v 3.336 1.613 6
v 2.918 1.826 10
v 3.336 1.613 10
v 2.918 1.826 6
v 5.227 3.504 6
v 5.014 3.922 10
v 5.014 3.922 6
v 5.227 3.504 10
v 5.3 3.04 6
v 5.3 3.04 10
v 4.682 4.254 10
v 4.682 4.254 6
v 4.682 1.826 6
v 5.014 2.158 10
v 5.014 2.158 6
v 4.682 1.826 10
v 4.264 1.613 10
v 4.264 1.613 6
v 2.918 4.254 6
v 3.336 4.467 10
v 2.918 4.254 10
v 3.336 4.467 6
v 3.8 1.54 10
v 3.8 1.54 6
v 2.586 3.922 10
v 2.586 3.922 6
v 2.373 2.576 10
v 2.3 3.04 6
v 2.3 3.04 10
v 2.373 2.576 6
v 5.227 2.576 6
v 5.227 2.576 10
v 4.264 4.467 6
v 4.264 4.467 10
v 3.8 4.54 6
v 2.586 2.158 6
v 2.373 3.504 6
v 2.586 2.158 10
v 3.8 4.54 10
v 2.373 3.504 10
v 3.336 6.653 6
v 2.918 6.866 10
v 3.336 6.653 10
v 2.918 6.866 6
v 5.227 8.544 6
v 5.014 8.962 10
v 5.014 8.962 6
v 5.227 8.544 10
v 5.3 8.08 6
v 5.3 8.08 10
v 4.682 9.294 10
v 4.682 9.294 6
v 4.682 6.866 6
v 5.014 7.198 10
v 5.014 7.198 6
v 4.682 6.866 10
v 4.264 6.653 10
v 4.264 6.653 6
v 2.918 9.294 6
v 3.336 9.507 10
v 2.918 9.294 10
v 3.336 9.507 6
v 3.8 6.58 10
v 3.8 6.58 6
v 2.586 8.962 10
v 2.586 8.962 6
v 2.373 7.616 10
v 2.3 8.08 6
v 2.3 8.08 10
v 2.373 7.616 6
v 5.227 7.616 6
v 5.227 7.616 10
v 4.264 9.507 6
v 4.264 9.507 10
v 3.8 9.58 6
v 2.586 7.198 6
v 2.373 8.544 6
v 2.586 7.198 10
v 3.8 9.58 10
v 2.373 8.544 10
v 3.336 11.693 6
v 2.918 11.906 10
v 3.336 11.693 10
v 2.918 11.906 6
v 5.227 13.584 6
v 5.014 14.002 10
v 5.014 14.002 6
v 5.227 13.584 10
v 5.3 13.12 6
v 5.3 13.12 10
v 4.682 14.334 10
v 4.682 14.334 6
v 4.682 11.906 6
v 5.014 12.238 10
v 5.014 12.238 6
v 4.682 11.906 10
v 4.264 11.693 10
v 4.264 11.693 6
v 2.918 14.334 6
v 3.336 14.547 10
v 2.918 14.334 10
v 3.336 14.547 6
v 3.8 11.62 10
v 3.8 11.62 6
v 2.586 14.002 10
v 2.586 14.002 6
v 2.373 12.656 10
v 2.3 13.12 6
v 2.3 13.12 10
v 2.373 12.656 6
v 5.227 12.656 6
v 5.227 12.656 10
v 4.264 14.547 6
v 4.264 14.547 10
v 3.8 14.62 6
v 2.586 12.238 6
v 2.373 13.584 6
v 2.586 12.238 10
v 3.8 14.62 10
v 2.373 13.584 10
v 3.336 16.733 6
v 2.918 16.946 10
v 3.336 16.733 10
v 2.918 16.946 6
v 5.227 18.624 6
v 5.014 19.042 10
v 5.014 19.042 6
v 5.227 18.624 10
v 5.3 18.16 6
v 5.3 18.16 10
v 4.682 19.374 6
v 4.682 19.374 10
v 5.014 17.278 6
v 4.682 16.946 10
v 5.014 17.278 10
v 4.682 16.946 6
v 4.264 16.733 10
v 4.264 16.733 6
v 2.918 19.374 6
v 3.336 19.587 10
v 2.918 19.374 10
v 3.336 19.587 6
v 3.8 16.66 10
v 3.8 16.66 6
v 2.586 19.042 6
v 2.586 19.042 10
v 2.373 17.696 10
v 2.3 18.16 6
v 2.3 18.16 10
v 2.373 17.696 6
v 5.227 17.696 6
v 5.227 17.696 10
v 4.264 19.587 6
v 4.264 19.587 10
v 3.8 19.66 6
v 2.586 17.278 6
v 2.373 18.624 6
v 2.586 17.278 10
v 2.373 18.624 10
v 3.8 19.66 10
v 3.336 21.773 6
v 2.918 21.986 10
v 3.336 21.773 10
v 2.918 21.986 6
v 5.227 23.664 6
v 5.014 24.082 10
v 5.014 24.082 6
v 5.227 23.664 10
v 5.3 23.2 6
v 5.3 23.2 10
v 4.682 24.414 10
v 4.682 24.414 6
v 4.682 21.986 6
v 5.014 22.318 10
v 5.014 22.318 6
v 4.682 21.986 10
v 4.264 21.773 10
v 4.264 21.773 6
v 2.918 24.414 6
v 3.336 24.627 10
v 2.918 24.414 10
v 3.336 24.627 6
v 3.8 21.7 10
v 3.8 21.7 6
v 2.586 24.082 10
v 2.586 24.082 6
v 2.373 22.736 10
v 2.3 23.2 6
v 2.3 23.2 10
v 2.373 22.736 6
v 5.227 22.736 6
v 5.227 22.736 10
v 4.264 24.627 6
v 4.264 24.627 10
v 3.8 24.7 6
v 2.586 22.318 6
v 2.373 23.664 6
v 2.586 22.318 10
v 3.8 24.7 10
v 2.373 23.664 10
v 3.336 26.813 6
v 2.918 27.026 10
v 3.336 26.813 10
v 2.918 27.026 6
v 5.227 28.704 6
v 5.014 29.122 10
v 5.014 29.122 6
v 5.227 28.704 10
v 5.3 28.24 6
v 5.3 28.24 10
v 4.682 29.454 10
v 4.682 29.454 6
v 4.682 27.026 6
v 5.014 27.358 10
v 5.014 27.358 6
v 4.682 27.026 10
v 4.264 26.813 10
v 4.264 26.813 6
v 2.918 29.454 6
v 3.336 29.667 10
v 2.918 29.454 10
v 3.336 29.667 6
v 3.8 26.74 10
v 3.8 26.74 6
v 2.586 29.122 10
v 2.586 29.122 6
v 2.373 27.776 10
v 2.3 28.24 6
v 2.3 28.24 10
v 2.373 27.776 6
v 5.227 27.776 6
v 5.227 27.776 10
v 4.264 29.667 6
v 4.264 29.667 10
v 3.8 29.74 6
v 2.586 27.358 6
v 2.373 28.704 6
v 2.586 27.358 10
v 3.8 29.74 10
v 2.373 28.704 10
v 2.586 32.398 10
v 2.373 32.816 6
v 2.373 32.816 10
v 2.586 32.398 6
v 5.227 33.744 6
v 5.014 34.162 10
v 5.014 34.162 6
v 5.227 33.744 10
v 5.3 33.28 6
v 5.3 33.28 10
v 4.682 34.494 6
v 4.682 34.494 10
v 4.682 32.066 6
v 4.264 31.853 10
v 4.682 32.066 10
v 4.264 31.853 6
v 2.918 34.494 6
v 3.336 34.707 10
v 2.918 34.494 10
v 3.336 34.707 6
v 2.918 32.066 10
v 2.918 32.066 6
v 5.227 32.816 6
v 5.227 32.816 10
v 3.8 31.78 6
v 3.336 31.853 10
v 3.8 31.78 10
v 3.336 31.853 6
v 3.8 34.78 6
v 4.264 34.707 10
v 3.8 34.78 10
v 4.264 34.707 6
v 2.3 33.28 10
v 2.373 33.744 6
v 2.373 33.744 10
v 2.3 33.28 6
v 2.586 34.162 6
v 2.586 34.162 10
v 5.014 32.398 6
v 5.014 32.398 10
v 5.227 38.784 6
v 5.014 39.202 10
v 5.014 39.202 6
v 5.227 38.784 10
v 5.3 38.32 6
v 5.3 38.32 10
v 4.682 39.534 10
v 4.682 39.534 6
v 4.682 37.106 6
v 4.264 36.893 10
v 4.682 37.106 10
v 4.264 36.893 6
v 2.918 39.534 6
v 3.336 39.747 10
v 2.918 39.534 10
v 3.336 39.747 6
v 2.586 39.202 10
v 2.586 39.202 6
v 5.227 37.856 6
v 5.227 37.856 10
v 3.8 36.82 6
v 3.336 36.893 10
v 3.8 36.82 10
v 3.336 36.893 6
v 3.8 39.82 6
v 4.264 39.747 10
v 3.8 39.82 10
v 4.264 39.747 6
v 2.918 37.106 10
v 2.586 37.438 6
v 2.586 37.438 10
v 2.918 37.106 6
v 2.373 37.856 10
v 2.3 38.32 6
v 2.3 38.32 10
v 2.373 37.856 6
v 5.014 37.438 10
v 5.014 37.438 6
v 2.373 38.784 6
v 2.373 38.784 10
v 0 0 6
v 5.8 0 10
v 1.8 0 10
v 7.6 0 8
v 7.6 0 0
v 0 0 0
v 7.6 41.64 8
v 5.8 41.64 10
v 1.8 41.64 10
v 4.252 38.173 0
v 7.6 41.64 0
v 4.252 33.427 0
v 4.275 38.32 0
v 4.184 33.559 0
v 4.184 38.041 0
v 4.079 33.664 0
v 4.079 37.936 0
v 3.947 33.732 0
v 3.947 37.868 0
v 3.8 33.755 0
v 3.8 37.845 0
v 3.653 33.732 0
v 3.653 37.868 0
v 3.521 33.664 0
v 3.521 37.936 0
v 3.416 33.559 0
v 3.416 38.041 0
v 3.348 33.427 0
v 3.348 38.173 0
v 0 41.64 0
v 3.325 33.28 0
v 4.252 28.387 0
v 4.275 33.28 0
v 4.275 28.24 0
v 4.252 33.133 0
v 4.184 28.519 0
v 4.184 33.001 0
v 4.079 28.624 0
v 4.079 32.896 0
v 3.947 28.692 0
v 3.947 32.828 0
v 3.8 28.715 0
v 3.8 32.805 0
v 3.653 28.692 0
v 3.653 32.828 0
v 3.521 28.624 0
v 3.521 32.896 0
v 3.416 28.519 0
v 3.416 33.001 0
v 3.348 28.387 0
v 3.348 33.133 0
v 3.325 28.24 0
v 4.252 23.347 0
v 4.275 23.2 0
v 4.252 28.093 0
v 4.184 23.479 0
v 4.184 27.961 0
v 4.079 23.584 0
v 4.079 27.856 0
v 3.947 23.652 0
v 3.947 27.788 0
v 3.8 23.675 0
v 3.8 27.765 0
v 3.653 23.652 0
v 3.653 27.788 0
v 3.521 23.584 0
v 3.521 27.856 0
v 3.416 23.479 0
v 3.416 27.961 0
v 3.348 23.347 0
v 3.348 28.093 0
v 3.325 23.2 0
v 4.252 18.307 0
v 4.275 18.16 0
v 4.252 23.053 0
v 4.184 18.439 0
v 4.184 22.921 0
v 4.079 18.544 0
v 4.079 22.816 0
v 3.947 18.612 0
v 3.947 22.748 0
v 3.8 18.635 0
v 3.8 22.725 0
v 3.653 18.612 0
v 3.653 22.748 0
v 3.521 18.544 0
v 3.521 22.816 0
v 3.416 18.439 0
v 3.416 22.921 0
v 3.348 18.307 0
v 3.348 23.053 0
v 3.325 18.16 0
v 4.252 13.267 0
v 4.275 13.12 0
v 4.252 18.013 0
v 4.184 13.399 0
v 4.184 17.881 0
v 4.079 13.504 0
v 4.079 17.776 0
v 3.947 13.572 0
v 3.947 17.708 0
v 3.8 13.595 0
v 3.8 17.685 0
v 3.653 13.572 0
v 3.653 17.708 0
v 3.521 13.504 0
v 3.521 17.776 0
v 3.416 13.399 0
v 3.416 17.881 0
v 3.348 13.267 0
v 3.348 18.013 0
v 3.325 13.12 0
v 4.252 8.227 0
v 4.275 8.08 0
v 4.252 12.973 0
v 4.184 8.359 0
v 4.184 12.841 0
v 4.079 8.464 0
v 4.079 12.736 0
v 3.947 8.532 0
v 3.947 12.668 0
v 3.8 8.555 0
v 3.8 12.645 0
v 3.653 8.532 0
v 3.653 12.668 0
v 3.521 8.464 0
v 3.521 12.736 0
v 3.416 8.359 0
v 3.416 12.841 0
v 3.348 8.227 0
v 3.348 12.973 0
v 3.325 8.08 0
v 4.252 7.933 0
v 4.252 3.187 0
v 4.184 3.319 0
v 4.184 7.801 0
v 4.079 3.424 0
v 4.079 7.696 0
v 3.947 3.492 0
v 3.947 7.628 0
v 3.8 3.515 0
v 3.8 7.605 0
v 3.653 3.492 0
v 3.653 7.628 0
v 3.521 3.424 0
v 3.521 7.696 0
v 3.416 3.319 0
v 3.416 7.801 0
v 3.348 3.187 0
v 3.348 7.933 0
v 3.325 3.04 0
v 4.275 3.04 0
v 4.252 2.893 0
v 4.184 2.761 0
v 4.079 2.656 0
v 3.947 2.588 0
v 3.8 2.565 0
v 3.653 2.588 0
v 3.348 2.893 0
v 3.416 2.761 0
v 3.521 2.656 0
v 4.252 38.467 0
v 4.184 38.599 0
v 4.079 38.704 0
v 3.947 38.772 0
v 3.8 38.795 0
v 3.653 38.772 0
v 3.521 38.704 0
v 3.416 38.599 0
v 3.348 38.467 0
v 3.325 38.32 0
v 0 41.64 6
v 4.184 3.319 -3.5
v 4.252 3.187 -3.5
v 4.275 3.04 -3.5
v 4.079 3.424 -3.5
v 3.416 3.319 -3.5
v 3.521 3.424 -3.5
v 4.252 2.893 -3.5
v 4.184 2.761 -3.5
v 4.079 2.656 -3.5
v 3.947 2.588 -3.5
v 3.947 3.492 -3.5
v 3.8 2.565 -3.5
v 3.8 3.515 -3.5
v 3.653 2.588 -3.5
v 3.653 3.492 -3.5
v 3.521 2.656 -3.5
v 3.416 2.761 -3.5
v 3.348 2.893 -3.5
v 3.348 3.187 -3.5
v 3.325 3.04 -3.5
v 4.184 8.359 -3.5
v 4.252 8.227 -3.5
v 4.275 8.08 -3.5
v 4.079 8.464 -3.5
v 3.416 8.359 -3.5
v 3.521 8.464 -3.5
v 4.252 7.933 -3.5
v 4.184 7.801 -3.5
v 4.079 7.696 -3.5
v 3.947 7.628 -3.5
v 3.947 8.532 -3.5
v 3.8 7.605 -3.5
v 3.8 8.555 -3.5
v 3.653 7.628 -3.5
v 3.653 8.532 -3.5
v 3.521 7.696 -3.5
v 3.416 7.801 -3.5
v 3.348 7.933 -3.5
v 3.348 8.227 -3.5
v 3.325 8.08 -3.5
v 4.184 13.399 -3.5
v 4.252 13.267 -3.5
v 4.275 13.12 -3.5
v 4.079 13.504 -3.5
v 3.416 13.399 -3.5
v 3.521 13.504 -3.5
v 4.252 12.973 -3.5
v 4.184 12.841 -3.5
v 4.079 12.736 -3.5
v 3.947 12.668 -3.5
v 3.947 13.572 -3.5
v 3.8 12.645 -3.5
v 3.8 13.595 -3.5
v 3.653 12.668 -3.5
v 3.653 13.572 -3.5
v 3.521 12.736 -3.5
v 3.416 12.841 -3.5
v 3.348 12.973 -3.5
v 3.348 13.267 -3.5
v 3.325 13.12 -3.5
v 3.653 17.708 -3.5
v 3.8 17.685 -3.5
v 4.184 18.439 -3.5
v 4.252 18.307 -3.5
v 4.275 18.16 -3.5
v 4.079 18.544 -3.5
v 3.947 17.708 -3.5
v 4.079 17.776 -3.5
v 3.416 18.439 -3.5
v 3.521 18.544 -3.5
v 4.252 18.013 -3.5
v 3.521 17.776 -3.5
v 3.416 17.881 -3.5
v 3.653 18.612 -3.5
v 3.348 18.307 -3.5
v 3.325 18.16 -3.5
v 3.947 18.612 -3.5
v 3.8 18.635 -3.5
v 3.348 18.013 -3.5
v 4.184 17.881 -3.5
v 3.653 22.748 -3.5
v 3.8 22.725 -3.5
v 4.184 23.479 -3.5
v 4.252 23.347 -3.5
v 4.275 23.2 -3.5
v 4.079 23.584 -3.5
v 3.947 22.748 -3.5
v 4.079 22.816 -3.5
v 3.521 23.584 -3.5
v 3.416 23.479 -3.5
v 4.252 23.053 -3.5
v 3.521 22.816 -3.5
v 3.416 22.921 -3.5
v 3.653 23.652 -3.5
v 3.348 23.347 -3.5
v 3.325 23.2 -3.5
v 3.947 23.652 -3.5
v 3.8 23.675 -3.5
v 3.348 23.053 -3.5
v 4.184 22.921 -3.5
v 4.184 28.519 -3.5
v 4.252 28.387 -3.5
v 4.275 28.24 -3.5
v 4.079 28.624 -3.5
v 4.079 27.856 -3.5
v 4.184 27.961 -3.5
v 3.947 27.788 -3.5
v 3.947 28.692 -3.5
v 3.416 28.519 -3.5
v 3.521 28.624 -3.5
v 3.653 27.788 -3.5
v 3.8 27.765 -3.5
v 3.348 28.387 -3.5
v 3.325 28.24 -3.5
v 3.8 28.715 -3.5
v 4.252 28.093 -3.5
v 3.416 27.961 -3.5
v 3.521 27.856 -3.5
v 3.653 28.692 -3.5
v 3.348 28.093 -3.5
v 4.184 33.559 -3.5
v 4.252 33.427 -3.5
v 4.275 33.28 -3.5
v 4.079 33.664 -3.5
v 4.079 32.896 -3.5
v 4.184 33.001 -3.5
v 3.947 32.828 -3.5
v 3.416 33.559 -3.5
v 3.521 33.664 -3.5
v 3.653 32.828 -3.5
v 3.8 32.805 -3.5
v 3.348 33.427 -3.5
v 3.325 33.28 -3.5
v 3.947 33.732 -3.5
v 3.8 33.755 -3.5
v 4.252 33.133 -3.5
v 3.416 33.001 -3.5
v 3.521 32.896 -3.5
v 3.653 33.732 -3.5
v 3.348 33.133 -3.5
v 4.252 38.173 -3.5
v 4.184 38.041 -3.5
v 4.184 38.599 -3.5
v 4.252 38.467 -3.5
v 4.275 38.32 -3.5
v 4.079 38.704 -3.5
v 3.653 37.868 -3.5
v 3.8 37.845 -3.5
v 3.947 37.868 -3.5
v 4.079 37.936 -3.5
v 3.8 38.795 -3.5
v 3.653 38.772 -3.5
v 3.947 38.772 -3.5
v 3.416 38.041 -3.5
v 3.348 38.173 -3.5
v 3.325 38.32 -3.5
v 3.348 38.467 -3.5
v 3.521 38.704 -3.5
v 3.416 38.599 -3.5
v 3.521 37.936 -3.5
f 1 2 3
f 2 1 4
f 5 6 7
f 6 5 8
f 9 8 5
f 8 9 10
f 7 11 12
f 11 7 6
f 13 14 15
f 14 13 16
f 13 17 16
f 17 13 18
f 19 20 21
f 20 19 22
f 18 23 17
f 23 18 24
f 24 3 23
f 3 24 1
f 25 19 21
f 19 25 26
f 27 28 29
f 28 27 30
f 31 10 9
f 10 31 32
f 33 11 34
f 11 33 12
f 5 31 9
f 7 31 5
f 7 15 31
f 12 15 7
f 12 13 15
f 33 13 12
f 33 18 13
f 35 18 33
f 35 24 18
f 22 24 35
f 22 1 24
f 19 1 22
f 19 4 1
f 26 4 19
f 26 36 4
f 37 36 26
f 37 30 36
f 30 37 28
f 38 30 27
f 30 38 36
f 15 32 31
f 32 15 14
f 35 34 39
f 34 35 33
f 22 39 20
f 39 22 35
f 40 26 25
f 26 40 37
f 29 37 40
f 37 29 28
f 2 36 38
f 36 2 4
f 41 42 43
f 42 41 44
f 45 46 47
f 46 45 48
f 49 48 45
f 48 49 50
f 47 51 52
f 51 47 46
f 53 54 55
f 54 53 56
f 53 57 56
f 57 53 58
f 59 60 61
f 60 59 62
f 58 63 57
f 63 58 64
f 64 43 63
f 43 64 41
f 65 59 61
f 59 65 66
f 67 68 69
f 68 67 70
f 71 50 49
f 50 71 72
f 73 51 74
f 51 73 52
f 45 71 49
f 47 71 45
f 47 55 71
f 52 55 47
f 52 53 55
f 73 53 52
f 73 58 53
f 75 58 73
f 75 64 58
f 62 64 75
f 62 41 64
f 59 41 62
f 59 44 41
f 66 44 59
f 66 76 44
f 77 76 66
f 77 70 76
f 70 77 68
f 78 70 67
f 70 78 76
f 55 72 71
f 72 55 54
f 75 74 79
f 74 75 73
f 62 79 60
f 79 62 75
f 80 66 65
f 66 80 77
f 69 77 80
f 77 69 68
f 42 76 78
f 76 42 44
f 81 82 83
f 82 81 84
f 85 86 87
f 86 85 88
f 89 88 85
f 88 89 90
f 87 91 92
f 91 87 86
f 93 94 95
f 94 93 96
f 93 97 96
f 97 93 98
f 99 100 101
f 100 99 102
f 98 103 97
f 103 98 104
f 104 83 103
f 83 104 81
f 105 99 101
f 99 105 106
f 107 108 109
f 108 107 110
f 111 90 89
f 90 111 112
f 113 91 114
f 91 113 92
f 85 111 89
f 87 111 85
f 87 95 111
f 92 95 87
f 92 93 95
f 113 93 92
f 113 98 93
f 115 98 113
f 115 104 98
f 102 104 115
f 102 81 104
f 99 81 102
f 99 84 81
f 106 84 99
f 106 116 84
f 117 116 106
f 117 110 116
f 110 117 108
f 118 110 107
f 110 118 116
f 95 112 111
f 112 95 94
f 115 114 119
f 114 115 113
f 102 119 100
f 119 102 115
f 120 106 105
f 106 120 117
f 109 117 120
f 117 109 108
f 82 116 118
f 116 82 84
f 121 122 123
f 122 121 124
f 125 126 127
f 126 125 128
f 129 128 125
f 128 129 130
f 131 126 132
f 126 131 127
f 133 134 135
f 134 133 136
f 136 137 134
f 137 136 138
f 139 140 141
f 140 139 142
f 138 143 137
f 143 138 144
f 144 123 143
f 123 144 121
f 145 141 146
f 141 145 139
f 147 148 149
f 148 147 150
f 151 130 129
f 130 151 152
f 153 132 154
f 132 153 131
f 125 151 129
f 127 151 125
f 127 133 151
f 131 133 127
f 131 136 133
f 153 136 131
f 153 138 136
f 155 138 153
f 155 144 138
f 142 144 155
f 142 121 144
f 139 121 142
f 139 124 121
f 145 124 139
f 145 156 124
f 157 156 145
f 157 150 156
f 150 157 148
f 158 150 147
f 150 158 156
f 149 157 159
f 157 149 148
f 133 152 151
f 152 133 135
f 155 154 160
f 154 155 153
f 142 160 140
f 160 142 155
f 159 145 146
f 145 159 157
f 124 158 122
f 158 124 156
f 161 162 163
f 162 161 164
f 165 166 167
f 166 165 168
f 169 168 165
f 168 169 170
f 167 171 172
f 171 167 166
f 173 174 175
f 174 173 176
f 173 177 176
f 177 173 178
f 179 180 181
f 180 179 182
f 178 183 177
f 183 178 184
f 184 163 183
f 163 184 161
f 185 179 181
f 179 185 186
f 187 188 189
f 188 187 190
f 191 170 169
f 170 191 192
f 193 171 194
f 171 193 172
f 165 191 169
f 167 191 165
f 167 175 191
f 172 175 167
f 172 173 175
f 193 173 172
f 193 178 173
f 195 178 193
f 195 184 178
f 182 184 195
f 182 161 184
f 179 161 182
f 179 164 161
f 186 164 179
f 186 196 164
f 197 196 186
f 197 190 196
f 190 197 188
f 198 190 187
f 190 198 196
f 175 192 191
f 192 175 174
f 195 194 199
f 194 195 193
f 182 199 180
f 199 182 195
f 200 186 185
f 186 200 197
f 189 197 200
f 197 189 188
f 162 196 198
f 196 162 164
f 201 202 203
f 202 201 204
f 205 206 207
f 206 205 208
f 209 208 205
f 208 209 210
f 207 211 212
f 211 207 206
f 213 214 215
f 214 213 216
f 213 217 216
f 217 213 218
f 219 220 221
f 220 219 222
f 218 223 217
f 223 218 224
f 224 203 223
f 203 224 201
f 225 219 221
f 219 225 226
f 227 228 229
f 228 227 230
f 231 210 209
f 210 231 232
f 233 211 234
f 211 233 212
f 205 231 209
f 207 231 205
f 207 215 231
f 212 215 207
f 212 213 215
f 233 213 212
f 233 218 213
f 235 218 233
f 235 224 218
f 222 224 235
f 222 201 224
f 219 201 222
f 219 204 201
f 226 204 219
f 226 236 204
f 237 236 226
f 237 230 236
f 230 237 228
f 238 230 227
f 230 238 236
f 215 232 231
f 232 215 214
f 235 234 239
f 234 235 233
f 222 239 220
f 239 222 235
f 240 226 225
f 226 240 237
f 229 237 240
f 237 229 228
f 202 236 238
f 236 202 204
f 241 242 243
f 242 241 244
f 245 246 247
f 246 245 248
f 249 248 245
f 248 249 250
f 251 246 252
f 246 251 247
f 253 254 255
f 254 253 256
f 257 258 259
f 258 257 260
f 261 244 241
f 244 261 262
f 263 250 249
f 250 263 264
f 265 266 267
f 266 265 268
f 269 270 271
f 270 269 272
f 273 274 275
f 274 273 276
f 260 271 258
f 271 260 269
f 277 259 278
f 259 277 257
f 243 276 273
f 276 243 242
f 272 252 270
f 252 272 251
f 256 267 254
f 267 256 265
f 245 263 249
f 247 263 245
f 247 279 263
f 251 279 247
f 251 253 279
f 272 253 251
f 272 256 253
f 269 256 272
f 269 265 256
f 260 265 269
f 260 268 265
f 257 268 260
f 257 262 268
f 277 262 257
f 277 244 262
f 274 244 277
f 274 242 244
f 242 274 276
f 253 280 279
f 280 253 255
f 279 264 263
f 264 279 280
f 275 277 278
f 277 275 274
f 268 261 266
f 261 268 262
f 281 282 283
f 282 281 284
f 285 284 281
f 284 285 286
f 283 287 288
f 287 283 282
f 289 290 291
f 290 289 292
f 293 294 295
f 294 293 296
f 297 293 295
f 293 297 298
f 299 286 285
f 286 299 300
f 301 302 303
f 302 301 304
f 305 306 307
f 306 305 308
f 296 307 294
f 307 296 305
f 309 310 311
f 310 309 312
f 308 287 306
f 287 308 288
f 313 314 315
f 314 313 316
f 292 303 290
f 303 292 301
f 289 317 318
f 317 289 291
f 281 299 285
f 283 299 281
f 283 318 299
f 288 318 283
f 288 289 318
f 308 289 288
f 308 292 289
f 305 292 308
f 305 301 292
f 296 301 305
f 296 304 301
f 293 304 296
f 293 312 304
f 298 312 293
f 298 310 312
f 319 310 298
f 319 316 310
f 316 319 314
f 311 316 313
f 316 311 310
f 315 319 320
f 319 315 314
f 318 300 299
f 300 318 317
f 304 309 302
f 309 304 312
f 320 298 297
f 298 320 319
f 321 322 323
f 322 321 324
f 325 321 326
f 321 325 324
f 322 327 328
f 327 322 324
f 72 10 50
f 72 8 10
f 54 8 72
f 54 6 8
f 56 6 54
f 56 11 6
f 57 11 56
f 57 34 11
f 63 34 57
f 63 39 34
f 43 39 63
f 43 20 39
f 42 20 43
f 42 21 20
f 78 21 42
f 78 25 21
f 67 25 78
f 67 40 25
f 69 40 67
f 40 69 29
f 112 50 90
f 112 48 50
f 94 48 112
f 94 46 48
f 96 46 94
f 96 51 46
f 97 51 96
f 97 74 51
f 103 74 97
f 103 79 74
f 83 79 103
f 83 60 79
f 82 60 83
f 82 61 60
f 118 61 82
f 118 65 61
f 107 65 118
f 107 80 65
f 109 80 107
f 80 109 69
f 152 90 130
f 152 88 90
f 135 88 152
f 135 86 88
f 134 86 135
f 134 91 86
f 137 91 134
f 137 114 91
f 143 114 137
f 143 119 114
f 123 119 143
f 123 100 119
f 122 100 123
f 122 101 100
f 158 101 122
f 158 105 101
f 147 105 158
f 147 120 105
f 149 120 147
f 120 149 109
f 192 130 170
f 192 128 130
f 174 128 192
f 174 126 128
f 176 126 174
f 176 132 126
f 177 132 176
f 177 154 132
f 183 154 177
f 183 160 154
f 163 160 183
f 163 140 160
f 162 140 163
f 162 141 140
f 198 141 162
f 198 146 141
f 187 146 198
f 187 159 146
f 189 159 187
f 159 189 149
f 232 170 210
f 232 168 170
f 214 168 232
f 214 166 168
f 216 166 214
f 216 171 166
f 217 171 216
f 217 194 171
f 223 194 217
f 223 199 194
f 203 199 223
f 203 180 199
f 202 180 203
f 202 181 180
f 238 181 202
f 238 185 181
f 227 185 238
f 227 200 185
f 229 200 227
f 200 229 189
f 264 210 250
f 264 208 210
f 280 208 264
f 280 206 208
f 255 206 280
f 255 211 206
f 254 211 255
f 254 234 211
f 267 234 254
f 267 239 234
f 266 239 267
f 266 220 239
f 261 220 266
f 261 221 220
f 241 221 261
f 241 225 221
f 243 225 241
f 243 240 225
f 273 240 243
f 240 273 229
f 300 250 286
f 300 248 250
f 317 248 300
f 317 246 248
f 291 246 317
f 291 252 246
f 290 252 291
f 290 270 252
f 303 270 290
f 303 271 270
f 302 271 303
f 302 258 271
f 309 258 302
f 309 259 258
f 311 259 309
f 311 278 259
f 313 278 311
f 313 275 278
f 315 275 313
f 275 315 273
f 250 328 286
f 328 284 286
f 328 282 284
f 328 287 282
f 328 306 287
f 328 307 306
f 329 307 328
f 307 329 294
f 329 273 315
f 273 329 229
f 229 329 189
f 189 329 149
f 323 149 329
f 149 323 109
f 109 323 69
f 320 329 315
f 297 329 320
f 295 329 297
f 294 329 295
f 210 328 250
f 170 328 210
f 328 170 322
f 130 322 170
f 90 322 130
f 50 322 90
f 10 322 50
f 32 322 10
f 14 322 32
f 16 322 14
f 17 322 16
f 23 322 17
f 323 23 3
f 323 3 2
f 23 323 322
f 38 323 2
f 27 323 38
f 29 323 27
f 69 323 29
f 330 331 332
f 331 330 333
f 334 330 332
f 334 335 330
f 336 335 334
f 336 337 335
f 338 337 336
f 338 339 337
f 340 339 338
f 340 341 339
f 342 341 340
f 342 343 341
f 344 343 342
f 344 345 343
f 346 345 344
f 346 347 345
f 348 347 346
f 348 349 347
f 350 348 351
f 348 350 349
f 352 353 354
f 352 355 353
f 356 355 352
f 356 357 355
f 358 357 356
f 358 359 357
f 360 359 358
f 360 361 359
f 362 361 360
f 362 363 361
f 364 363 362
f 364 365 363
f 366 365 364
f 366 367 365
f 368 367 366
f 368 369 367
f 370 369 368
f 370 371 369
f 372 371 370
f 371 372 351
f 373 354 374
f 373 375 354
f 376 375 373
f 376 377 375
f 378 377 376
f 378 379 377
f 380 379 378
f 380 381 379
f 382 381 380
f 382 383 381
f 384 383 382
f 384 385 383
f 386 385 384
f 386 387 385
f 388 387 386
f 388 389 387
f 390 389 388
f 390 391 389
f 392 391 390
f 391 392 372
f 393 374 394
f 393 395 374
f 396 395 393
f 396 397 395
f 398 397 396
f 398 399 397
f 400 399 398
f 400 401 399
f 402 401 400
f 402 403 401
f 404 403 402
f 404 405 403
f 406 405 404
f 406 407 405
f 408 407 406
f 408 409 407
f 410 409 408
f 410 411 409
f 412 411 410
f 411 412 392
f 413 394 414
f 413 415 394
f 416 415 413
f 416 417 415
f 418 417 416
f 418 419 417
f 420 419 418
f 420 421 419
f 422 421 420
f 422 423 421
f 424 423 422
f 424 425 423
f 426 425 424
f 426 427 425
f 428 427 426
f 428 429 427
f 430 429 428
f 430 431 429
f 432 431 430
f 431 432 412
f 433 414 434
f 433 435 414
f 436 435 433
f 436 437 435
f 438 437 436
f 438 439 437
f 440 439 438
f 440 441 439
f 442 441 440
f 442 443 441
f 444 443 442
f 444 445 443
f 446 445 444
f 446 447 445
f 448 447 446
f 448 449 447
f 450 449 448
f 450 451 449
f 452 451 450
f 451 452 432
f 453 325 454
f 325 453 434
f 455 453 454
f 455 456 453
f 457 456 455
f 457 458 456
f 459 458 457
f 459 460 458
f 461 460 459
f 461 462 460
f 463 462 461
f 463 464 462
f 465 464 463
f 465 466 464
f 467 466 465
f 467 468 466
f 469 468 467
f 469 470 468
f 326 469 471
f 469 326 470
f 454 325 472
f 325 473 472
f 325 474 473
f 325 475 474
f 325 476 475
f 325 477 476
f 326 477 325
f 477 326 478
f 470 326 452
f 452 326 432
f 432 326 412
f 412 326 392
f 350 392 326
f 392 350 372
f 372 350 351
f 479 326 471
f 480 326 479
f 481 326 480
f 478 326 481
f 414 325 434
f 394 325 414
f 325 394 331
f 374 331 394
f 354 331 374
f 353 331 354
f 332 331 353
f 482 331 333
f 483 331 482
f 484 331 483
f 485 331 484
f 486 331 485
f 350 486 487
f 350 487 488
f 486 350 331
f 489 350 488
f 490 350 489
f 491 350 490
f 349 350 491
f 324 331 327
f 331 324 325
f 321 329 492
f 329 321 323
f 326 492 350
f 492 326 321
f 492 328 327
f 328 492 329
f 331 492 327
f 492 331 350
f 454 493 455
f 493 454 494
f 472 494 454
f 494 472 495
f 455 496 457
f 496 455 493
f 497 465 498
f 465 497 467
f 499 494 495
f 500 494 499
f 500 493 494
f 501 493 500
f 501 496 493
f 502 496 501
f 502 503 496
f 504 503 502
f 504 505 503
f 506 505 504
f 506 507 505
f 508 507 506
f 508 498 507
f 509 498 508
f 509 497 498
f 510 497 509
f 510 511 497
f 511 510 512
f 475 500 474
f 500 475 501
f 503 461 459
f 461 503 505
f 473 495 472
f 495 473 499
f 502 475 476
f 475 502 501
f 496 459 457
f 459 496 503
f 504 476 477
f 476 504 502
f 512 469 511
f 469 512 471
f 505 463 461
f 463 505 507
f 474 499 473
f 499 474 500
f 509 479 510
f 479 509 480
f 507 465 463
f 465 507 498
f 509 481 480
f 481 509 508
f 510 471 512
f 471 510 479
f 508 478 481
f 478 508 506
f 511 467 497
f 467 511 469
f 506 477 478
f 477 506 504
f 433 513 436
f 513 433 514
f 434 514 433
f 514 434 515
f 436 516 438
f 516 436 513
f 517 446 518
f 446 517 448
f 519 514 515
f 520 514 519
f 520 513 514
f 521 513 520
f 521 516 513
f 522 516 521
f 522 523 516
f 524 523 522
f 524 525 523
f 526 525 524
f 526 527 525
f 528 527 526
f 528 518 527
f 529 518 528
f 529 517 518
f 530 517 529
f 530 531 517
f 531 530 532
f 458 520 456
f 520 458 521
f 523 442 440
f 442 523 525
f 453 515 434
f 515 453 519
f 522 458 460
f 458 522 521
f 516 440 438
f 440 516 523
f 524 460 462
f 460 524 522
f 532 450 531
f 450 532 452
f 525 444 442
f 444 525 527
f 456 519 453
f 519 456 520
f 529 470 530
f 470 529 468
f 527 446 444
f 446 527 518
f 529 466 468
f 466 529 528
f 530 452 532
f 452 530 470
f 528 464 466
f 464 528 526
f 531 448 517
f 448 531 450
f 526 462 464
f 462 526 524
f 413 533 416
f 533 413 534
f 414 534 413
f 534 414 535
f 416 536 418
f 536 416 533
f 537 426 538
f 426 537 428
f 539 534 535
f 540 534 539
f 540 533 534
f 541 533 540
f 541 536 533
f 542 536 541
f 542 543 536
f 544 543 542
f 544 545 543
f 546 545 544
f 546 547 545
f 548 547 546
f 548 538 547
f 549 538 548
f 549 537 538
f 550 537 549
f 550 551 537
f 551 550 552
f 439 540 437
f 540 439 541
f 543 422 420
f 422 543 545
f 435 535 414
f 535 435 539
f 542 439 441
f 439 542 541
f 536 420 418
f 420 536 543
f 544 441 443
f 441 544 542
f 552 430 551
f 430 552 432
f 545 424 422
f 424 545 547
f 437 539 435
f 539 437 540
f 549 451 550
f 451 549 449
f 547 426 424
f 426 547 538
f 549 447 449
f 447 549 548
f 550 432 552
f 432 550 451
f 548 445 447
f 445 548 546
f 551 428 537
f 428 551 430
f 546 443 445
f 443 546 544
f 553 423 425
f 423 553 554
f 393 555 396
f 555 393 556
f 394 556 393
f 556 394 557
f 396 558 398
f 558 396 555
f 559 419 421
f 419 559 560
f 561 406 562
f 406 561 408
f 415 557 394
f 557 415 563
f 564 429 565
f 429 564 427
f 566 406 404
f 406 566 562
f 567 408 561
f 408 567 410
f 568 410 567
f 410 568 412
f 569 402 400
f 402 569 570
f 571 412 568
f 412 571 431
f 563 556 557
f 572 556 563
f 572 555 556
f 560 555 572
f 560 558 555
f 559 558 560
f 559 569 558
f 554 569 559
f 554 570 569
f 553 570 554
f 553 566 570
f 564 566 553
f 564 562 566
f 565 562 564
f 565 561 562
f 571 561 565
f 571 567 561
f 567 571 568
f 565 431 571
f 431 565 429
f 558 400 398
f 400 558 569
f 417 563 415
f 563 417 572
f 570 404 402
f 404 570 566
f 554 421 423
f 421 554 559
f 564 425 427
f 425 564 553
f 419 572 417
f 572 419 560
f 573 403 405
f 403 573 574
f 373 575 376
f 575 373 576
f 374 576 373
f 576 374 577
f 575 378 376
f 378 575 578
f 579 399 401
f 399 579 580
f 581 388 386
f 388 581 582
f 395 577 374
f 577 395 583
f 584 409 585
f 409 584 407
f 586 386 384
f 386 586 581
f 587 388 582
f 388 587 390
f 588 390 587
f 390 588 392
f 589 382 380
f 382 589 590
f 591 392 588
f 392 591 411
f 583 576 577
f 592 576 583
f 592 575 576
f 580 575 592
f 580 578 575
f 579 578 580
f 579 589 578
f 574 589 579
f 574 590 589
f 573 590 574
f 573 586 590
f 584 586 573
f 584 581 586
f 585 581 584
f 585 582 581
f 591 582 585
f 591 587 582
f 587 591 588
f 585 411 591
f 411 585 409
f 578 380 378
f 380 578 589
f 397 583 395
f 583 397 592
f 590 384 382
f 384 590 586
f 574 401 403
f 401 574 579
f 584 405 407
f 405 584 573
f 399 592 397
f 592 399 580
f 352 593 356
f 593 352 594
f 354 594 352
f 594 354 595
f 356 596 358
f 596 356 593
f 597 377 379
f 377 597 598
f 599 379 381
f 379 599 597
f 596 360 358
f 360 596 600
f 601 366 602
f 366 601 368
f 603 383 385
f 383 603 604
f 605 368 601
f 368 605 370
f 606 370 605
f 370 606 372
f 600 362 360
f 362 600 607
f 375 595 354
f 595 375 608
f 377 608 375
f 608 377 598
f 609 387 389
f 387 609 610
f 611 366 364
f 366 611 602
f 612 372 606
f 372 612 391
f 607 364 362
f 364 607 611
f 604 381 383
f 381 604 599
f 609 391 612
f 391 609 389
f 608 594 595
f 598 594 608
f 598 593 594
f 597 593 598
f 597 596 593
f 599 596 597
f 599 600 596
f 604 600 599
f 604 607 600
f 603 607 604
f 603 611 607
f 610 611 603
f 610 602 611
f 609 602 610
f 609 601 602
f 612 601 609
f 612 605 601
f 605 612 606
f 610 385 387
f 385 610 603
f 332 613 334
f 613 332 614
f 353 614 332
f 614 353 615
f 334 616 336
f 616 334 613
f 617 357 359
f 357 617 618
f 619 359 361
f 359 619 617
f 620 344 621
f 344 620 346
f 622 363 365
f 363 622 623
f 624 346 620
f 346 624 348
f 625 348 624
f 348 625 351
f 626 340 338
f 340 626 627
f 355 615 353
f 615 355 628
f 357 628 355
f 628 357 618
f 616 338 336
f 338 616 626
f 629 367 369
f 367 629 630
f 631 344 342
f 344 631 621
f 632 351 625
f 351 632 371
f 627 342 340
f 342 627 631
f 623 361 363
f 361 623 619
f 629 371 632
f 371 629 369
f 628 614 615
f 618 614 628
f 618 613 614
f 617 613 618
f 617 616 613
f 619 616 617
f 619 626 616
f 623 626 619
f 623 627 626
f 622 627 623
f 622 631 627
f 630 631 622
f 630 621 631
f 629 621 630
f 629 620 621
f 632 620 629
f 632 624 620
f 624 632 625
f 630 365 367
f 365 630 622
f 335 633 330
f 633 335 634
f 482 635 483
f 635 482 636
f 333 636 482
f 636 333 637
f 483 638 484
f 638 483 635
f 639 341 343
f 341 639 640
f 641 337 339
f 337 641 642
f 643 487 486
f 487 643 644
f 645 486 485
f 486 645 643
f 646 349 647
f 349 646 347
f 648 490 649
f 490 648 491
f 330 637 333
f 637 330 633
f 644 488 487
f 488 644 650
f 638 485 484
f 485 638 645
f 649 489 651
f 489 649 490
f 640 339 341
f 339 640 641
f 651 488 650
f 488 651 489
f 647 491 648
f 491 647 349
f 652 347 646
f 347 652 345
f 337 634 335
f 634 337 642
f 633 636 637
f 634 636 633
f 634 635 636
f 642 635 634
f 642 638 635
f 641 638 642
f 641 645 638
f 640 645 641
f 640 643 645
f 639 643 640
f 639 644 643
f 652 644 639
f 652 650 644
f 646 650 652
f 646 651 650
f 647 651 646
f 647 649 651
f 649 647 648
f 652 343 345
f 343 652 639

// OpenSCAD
$fn=20;
/*difference(){
	union(){
		cube([4,41.64,10]);
		translate([-1.8,0,0]){
 			cube([1.8,41.64,6]);
		}

		translate([4,0,0]){
 			cube([1.8,41.64,8]);
		}

		translate([4,41.64,8])
		rotate([90,0,0])
		linear_extrude(height=41.64)
		polygon(	[[0,0],
					[1.8,0],
					[0,2]]
					);
	
		translate([0,41.64,6])
		rotate([90,0.0])
		linear_extrude(height=41.64)
		polygon( [[0,0], [-1.8,0], [0,4]]);
		
}
*/
difference(){
translate([0,41.64,0])
rotate([90,0,0])
linear_extrude(height=41.64)
polygon([[0,0],
         [7.6,0],
         [7.6,8],
         [5.8,10],
         [1.8,10],
         [0,6]]);

	for(i=[0:7]){
		translate([3.8,(3.04+(5.04*i)),6])
		cylinder(h=5,d=3);
	}
}

for(i=[0:7]){
	translate([3.8,(3.04+(5.04*i)),-3.5])
	cylinder(h=3.5,d=0.95);
}
